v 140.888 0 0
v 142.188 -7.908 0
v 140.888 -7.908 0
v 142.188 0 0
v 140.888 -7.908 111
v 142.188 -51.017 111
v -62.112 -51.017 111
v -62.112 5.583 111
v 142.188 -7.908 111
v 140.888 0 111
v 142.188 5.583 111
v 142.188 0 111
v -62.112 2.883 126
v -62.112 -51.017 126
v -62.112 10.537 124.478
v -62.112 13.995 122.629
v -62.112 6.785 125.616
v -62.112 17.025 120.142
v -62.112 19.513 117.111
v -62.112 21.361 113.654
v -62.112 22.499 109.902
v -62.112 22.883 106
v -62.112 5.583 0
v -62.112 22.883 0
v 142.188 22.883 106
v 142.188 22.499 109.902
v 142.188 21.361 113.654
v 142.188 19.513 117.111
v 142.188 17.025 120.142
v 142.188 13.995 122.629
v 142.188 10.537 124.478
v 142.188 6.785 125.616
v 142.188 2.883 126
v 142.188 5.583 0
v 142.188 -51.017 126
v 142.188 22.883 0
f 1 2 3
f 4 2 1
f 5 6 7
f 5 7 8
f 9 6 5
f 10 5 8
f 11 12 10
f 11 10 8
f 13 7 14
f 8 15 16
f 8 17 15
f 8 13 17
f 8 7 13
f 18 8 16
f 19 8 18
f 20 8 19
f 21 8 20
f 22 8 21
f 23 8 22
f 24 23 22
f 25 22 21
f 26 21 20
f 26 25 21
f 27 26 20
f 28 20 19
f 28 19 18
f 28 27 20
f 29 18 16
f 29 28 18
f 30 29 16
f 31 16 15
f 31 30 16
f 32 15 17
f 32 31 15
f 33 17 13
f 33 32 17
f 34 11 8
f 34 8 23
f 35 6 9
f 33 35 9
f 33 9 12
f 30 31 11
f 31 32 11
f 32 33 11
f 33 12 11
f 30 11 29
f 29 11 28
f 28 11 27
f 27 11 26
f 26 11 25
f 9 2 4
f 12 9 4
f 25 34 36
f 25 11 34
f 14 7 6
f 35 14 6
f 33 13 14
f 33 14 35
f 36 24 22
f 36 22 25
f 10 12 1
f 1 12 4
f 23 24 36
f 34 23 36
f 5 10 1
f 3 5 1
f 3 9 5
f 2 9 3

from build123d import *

# Parameters (mm, degrees)
SKETCH2_W           = 204.3
SKETCH2_H           = 73.9
BOSS_EXTRUDE1_DEPTH = 126
SKETCH3_W           = 111
SKETCH3_H           = 56.6
CUT_EXTRUDE2_DEPTH  = 274.3
FILLET1_R           = 20
SKETCH5_W           = 111
SKETCH5_H           = 7.907805674
BOSS_EXTRUDE4_DEPTH = 1.3


with BuildPart() as part:
    # Sketch2 → Boss-Extrude1 (new body)
    with BuildSketch(Plane.XY):
        with Locations((40.038337802, -14.066756032)):
            Rectangle(SKETCH2_W, SKETCH2_H)
    extrude(amount=BOSS_EXTRUDE1_DEPTH)

    # Sketch3 → Cut-Extrude2 (cut)
    with BuildSketch(Plane(origin=(142.188337802, 0, 0), x_dir=(0, 0, -1), z_dir=(1, 0, 0))):
        with Locations((-55.5, -22.716756032)):
            Rectangle(SKETCH3_W, SKETCH3_H)
    extrude(amount=-CUT_EXTRUDE2_DEPTH, mode=Mode.SUBTRACT)

    # Fillet1
    fillet1_edges = [part.edges().sort_by_distance(p)[0] for p in [
        (40.038337802, 22.883243968, 126),
    ]]
    fillet(fillet1_edges, radius=FILLET1_R)

    # Sketch5 → Boss-Extrude4 (add)
    with BuildSketch(Plane(origin=(142.188337802, 0, 0), x_dir=(0, 0, -1), z_dir=(1, 0, 0))):
        with Locations((-55.5, -3.953902837)):
            Rectangle(SKETCH5_W, SKETCH5_H)
    extrude(amount=-BOSS_EXTRUDE4_DEPTH)


solid = part.part
